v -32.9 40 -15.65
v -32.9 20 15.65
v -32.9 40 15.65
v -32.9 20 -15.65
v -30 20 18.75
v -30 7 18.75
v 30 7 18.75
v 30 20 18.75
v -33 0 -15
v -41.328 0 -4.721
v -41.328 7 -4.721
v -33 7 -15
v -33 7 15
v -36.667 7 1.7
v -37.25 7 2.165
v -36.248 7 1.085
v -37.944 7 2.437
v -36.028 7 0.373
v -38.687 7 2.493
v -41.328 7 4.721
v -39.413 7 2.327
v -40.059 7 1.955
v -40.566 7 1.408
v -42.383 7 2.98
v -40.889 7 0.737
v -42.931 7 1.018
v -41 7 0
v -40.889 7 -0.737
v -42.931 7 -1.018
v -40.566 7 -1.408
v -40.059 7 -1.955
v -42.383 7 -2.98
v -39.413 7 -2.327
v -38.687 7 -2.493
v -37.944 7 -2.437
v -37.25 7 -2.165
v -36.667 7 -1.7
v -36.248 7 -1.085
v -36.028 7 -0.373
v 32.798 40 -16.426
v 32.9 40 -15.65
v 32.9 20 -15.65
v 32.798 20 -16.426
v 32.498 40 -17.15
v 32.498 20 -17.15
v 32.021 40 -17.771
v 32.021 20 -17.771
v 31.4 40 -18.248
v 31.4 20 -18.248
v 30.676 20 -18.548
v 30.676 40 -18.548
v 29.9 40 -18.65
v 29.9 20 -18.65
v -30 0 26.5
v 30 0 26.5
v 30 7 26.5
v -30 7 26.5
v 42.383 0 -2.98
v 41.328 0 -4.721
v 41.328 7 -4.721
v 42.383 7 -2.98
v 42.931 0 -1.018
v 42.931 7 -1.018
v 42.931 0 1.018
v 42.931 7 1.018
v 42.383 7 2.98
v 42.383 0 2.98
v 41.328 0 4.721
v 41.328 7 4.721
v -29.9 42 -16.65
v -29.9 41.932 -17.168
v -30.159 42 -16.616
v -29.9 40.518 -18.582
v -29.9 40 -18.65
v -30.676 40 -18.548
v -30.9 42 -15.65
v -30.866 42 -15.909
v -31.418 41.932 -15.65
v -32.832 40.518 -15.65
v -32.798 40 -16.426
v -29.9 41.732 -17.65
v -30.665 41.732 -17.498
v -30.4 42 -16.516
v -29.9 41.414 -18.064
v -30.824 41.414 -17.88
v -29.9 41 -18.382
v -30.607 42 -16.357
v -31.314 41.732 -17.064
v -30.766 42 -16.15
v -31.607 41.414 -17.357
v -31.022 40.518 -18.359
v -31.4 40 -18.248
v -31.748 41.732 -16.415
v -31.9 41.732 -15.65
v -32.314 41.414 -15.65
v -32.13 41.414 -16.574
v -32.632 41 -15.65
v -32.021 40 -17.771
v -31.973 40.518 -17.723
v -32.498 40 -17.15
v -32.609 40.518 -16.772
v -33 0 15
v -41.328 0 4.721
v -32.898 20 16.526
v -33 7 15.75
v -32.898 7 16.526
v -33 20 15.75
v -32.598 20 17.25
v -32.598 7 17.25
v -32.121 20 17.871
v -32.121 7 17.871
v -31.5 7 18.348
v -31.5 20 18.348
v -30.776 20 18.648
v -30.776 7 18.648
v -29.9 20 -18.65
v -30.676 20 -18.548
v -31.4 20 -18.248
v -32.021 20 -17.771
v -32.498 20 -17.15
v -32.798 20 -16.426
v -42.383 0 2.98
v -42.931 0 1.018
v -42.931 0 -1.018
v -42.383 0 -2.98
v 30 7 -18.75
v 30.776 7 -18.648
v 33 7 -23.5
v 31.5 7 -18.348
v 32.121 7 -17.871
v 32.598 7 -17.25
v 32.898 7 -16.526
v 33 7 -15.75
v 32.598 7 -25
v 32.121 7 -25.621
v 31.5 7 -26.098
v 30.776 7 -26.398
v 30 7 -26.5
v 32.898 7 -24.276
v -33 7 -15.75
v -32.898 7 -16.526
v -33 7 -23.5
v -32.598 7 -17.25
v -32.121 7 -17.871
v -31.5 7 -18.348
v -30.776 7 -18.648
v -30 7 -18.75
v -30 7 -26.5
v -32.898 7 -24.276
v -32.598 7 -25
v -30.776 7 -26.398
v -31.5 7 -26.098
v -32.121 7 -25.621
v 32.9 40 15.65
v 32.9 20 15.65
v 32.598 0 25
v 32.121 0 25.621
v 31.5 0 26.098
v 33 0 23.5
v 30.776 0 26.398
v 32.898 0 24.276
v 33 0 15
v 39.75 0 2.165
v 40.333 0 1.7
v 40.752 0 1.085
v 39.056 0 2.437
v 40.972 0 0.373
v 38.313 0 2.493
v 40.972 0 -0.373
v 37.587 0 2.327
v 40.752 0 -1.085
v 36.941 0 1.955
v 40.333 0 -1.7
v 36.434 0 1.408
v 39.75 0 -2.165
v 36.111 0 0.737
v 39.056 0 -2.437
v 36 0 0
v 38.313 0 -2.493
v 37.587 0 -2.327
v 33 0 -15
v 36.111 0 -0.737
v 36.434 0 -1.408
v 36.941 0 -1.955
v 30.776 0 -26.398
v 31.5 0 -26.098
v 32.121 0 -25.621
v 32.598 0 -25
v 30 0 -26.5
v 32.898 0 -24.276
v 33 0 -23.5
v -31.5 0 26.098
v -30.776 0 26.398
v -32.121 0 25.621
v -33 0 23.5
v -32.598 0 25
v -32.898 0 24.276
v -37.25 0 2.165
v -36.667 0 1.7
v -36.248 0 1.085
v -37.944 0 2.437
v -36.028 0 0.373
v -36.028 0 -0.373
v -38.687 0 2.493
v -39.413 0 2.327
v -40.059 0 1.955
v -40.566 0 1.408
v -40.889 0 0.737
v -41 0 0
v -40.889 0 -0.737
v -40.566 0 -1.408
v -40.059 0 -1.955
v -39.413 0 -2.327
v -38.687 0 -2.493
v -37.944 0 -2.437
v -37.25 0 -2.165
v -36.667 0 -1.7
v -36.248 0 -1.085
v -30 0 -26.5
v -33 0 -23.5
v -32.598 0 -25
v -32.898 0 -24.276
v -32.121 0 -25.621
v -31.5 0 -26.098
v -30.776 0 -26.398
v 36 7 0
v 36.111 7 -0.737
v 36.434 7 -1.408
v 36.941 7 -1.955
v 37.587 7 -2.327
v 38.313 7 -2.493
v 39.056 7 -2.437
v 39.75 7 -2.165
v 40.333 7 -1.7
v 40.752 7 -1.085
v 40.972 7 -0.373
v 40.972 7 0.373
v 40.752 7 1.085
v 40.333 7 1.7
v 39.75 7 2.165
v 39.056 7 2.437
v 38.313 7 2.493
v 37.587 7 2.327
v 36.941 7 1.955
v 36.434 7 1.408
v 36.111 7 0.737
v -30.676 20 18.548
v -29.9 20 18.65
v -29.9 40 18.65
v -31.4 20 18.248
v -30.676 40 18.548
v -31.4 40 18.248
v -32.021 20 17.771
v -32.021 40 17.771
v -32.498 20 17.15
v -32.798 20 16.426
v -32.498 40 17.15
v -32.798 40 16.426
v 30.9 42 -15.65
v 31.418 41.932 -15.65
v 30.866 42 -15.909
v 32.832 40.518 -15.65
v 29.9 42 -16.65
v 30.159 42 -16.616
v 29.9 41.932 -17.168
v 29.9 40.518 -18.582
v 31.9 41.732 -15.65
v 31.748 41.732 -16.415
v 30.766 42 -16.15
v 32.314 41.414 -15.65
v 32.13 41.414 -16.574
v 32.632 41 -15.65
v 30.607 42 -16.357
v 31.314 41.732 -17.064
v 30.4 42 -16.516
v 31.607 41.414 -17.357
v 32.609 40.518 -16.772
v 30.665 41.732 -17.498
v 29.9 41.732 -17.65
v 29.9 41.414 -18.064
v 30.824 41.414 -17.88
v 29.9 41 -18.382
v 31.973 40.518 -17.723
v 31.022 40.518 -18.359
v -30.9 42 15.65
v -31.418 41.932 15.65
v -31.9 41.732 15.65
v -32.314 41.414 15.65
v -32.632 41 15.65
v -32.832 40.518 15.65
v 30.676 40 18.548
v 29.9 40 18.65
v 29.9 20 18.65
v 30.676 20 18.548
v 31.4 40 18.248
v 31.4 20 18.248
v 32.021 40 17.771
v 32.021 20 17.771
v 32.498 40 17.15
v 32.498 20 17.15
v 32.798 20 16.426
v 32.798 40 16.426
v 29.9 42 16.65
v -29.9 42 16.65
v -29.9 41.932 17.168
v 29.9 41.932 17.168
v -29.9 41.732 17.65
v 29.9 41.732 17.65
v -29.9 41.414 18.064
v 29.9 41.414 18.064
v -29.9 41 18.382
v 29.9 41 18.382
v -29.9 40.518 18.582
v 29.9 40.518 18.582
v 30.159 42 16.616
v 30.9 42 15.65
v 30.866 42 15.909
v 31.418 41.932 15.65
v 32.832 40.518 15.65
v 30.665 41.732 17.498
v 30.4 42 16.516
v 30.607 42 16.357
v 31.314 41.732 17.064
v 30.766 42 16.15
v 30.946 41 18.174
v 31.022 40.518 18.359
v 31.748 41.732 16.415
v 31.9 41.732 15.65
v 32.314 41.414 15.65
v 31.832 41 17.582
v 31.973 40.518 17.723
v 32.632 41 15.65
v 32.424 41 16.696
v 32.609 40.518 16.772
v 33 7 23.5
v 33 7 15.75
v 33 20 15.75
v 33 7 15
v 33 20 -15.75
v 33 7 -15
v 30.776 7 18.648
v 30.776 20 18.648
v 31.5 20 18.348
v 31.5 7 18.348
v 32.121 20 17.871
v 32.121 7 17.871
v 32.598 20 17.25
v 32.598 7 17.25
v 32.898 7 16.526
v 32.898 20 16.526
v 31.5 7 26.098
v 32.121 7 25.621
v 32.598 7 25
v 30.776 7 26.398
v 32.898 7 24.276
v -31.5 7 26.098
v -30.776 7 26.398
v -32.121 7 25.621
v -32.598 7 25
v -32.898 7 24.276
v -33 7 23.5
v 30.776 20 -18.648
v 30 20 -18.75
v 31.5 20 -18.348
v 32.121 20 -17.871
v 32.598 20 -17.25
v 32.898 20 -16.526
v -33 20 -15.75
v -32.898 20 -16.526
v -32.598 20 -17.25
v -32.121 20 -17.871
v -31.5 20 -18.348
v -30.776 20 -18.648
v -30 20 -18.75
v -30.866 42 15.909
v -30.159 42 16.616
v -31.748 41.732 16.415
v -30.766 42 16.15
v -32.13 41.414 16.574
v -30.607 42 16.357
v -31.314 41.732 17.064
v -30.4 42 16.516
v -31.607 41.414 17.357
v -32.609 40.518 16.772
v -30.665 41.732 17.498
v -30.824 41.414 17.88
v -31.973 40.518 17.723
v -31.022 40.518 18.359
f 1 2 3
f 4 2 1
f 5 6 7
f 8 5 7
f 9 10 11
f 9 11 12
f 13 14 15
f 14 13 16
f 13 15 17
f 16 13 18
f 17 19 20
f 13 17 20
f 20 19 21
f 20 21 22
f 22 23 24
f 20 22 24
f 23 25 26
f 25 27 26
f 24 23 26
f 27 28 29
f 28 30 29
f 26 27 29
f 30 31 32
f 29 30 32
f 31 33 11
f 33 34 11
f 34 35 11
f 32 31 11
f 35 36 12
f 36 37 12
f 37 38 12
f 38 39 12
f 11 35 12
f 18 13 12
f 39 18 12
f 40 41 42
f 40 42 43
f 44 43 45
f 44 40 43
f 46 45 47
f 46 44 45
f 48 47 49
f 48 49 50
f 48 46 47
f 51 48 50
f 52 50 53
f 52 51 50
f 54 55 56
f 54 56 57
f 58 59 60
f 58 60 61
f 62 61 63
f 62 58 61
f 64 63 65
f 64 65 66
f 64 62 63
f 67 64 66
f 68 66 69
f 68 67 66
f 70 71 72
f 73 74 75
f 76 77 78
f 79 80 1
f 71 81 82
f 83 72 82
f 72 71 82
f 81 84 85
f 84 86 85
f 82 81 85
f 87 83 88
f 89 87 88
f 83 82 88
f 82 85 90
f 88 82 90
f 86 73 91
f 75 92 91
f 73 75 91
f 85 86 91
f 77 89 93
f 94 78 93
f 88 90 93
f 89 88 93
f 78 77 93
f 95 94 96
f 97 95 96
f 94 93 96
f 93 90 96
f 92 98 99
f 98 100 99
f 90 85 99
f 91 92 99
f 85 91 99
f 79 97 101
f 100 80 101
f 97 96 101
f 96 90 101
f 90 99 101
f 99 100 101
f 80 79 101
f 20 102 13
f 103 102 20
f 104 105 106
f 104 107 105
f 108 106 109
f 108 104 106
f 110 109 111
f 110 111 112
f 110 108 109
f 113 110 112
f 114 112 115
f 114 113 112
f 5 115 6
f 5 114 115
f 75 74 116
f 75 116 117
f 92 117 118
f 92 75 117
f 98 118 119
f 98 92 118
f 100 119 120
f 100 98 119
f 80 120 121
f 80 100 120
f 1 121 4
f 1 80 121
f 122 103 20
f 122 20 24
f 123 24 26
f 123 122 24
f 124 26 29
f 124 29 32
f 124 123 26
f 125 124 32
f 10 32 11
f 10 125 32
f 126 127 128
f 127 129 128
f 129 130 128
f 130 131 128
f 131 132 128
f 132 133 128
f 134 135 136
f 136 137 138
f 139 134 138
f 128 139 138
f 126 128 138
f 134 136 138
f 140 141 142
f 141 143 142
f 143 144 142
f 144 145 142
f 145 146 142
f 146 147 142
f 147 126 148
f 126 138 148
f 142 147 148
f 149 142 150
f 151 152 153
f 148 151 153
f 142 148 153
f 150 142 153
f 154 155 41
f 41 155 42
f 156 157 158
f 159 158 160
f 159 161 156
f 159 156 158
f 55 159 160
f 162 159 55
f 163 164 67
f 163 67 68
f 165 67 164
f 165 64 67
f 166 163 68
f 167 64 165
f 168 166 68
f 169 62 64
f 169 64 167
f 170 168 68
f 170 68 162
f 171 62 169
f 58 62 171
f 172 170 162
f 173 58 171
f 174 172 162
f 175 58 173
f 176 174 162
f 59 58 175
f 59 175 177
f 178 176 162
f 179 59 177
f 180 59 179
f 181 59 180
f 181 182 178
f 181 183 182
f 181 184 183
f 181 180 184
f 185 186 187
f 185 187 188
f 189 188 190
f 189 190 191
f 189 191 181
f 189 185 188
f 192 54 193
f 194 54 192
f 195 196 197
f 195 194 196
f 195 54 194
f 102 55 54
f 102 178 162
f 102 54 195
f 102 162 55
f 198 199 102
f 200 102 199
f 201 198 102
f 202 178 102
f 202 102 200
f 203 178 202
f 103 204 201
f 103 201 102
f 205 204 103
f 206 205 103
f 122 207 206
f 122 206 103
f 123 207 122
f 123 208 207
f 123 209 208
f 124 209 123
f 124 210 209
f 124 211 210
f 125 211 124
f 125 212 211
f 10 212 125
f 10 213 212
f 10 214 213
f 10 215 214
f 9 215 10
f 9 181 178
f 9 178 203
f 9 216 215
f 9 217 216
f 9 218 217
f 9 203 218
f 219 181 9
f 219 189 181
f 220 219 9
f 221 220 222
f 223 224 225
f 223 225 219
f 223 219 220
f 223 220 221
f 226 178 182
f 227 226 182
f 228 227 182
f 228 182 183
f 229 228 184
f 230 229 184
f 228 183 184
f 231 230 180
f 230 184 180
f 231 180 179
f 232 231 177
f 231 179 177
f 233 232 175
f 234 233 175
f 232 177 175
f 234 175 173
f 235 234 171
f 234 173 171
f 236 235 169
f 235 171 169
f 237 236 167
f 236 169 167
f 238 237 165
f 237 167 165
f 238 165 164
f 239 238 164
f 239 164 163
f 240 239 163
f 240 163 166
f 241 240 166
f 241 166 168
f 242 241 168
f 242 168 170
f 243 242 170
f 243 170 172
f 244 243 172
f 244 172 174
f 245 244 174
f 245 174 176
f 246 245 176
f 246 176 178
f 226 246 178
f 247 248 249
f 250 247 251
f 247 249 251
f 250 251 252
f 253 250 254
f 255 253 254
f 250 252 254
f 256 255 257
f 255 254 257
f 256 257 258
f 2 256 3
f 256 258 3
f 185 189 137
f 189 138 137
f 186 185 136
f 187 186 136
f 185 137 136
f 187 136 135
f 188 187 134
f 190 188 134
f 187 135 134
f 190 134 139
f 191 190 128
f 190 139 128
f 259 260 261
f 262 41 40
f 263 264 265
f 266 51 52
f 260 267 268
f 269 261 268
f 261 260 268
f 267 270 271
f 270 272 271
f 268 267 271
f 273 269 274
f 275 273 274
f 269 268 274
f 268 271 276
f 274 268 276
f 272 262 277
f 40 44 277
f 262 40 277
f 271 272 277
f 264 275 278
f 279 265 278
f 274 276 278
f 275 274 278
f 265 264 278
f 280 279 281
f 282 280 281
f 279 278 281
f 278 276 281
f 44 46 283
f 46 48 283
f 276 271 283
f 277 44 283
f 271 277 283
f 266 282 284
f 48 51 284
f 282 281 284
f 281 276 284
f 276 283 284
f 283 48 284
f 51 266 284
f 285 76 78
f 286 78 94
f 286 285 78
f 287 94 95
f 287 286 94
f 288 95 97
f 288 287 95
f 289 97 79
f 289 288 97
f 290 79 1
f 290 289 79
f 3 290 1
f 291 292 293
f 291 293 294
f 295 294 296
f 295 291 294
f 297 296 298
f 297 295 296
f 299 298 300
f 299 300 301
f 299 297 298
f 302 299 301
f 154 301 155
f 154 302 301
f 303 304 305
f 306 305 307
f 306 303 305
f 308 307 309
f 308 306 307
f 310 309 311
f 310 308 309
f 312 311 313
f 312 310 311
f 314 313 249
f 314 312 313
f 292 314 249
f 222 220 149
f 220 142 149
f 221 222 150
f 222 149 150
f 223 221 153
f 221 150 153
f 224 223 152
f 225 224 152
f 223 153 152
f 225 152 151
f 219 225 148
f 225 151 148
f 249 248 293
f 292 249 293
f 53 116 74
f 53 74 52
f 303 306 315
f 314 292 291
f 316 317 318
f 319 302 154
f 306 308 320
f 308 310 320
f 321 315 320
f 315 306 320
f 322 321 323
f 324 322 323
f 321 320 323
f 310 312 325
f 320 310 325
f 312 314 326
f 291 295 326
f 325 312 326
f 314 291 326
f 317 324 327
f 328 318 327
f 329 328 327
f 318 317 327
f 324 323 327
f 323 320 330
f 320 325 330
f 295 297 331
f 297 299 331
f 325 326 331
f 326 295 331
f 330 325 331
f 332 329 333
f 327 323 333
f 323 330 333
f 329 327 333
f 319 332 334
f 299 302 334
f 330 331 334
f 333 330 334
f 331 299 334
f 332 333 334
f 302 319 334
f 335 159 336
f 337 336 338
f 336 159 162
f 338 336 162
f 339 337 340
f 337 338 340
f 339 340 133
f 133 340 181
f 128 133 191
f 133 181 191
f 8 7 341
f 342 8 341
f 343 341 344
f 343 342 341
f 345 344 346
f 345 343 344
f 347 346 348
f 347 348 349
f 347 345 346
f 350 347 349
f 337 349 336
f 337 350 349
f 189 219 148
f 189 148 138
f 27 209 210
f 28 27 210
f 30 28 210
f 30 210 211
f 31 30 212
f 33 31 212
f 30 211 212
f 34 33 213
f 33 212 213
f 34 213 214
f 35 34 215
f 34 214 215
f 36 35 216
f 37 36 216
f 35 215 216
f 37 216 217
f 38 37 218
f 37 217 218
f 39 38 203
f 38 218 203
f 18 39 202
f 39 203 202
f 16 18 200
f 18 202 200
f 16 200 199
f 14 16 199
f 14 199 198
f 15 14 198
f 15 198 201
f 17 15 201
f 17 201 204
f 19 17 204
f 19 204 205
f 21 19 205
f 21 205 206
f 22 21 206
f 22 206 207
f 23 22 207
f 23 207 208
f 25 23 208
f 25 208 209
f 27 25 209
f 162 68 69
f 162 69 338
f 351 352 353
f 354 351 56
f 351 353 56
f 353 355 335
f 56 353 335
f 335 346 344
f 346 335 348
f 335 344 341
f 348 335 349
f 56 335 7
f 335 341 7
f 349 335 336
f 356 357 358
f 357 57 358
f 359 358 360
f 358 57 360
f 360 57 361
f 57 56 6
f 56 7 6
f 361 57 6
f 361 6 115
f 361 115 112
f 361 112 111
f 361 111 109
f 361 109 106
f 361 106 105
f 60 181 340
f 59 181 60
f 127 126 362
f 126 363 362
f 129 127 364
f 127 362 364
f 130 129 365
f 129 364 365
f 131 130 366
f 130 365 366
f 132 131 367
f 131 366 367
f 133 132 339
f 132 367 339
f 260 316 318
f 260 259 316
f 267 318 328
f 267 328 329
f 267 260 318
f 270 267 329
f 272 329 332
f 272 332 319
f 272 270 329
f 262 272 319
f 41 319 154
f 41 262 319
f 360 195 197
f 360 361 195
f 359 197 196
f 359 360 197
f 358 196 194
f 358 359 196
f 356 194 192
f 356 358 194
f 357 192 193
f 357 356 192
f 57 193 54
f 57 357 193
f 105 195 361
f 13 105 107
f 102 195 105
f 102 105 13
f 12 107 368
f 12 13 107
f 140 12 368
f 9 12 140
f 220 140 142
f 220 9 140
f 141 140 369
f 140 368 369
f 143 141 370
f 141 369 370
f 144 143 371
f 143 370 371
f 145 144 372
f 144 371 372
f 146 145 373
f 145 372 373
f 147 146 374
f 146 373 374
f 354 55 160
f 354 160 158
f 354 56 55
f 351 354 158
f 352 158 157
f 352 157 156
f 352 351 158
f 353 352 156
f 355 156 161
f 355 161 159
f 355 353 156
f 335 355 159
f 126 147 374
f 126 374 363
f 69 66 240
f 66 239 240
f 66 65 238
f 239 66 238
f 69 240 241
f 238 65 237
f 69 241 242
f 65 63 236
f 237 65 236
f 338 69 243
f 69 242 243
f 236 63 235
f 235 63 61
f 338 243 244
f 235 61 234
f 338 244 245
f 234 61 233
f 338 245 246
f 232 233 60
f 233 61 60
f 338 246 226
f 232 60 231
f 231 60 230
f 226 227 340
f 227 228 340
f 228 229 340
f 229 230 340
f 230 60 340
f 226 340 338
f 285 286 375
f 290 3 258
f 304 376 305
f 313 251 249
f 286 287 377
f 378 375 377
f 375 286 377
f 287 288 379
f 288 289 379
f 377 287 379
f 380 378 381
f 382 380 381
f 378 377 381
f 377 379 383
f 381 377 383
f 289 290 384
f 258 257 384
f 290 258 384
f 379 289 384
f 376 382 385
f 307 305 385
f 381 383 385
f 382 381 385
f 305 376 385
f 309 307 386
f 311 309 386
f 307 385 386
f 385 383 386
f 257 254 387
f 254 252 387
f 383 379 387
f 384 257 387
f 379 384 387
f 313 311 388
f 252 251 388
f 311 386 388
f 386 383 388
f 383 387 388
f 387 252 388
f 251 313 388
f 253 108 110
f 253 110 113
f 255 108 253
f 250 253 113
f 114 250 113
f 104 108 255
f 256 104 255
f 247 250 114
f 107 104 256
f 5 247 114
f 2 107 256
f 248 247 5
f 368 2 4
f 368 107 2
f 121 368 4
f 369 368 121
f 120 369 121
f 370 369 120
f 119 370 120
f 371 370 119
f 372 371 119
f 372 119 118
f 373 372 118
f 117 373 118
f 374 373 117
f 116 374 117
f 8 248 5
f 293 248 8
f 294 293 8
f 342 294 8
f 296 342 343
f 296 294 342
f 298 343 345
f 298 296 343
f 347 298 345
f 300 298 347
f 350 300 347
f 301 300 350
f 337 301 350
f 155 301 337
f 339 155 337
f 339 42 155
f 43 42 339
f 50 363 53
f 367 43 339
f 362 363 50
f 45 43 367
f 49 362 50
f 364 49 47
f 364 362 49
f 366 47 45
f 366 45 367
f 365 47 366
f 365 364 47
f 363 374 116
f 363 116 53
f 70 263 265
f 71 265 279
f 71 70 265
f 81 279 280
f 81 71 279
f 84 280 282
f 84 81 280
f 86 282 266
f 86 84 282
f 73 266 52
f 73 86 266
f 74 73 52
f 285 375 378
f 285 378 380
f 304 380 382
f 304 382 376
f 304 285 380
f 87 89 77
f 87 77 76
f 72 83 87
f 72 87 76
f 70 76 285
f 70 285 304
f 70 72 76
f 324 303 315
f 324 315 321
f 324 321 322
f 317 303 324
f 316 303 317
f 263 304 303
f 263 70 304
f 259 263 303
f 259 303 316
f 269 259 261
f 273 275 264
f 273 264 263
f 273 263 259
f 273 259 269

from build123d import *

# Parameters (mm, degrees)
BOSS_EXTRUDE1_DEPTH       = 7
F_5_0MM_DOWEL_HOLE1_D     = 5
F_5_0MM_DOWEL_HOLE1_DEPTH = 7
SKETCH4_W                 = 66
SKETCH4_H                 = 37.5
BOSS_EXTRUDE2_DEPTH       = 13
SKETCH5_W                 = 65.8
SKETCH5_H                 = 37.3
BOSS_EXTRUDE3_DEPTH       = 22
FILLET1_R                 = 3
FILLET2_R                 = 2


with BuildPart() as part:
    # Sketch1 → Boss-Extrude1 (new body)
    with BuildSketch(Plane(origin=(0, 0, 0), x_dir=(1, 0, 0), z_dir=(0, 1, 0))):
        with BuildLine():
            Line((-41.327503189, 4.721250532), (-33, 15))
            Line((-33, 15), (-33, 26.5))
            Line((-33, 26.5), (33, 26.5))
            Line((33, 26.5), (33, 15))
            Line((33, 15), (41.327503189, 4.721250532))
            ThreePointArc((41.327503189, 4.721250532), (43, 0), (41.327503189, -4.721250532))
            Line((41.327503189, -4.721250532), (33, -15))
            Line((33, -15), (33, -26.5))
            Line((33, -26.5), (-33, -26.5))
            Line((-33, -26.5), (-33, -15))
            Line((-33, -15), (-41.327503189, -4.721250532))
            ThreePointArc((-41.327503189, -4.721250532), (-43, 0), (-41.327503189, 4.721250532))
        make_face()
    extrude(amount=BOSS_EXTRUDE1_DEPTH)

    # Ø5.0mm Dowel Hole1
    with Locations(Plane(origin=(0, 7, 0), x_dir=(1, 0, 0), z_dir=(0, 1, 0))):
        with Locations((-38.5, 0), (38.5, 0)):
            Hole(F_5_0MM_DOWEL_HOLE1_D / 2, depth=F_5_0MM_DOWEL_HOLE1_DEPTH)

    # Sketch4 → Boss-Extrude2 (add)
    with BuildSketch(Plane(origin=(0, 7, 0), x_dir=(1, 0, 0), z_dir=(0, 1, 0))):
        Rectangle(SKETCH4_W, SKETCH4_H)
    extrude(amount=BOSS_EXTRUDE2_DEPTH)

    # Sketch5 → Boss-Extrude3 (add)
    with BuildSketch(Plane(origin=(0, 20, 0), x_dir=(1, 0, 0), z_dir=(0, 1, 0))):
        Rectangle(SKETCH5_W, SKETCH5_H)
    extrude(amount=BOSS_EXTRUDE3_DEPTH)

    # Fillet1
    fillet1_edges = [part.edges().sort_by_distance(p)[0] for p in [
        (-33, 3.5, -26.5),
        (33, 3.5, -26.5),
        (33, 3.5, 26.5),
        (-33, 3.5, 26.5),
        (33, 13.5, 18.75),
        (33, 13.5, -18.75),
        (-33, 13.5, -18.75),
        (-33, 13.5, 18.75),
        (32.9, 31, 18.65),
        (32.9, 31, -18.65),
        (-32.9, 31, -18.65),
        (-32.9, 31, 18.65),
    ]]
    fillet(fillet1_edges, radius=FILLET1_R)

    # Fillet2
    fillet2_edges = [part.edges().sort_by_distance(p)[0] for p in [
        (32.9, 42, 0),
        (0, 42, 18.65),
        (0, 42, -18.65),
        (-32.9, 42, 0),
        (-32.021320344, 42, 17.771320344),
        (-32.021320344, 42, -17.771320344),
        (32.021320344, 42, -17.771320344),
        (32.021320344, 42, 17.771320344),
    ]]
    fillet(fillet2_edges, radius=FILLET2_R)


solid = part.part
